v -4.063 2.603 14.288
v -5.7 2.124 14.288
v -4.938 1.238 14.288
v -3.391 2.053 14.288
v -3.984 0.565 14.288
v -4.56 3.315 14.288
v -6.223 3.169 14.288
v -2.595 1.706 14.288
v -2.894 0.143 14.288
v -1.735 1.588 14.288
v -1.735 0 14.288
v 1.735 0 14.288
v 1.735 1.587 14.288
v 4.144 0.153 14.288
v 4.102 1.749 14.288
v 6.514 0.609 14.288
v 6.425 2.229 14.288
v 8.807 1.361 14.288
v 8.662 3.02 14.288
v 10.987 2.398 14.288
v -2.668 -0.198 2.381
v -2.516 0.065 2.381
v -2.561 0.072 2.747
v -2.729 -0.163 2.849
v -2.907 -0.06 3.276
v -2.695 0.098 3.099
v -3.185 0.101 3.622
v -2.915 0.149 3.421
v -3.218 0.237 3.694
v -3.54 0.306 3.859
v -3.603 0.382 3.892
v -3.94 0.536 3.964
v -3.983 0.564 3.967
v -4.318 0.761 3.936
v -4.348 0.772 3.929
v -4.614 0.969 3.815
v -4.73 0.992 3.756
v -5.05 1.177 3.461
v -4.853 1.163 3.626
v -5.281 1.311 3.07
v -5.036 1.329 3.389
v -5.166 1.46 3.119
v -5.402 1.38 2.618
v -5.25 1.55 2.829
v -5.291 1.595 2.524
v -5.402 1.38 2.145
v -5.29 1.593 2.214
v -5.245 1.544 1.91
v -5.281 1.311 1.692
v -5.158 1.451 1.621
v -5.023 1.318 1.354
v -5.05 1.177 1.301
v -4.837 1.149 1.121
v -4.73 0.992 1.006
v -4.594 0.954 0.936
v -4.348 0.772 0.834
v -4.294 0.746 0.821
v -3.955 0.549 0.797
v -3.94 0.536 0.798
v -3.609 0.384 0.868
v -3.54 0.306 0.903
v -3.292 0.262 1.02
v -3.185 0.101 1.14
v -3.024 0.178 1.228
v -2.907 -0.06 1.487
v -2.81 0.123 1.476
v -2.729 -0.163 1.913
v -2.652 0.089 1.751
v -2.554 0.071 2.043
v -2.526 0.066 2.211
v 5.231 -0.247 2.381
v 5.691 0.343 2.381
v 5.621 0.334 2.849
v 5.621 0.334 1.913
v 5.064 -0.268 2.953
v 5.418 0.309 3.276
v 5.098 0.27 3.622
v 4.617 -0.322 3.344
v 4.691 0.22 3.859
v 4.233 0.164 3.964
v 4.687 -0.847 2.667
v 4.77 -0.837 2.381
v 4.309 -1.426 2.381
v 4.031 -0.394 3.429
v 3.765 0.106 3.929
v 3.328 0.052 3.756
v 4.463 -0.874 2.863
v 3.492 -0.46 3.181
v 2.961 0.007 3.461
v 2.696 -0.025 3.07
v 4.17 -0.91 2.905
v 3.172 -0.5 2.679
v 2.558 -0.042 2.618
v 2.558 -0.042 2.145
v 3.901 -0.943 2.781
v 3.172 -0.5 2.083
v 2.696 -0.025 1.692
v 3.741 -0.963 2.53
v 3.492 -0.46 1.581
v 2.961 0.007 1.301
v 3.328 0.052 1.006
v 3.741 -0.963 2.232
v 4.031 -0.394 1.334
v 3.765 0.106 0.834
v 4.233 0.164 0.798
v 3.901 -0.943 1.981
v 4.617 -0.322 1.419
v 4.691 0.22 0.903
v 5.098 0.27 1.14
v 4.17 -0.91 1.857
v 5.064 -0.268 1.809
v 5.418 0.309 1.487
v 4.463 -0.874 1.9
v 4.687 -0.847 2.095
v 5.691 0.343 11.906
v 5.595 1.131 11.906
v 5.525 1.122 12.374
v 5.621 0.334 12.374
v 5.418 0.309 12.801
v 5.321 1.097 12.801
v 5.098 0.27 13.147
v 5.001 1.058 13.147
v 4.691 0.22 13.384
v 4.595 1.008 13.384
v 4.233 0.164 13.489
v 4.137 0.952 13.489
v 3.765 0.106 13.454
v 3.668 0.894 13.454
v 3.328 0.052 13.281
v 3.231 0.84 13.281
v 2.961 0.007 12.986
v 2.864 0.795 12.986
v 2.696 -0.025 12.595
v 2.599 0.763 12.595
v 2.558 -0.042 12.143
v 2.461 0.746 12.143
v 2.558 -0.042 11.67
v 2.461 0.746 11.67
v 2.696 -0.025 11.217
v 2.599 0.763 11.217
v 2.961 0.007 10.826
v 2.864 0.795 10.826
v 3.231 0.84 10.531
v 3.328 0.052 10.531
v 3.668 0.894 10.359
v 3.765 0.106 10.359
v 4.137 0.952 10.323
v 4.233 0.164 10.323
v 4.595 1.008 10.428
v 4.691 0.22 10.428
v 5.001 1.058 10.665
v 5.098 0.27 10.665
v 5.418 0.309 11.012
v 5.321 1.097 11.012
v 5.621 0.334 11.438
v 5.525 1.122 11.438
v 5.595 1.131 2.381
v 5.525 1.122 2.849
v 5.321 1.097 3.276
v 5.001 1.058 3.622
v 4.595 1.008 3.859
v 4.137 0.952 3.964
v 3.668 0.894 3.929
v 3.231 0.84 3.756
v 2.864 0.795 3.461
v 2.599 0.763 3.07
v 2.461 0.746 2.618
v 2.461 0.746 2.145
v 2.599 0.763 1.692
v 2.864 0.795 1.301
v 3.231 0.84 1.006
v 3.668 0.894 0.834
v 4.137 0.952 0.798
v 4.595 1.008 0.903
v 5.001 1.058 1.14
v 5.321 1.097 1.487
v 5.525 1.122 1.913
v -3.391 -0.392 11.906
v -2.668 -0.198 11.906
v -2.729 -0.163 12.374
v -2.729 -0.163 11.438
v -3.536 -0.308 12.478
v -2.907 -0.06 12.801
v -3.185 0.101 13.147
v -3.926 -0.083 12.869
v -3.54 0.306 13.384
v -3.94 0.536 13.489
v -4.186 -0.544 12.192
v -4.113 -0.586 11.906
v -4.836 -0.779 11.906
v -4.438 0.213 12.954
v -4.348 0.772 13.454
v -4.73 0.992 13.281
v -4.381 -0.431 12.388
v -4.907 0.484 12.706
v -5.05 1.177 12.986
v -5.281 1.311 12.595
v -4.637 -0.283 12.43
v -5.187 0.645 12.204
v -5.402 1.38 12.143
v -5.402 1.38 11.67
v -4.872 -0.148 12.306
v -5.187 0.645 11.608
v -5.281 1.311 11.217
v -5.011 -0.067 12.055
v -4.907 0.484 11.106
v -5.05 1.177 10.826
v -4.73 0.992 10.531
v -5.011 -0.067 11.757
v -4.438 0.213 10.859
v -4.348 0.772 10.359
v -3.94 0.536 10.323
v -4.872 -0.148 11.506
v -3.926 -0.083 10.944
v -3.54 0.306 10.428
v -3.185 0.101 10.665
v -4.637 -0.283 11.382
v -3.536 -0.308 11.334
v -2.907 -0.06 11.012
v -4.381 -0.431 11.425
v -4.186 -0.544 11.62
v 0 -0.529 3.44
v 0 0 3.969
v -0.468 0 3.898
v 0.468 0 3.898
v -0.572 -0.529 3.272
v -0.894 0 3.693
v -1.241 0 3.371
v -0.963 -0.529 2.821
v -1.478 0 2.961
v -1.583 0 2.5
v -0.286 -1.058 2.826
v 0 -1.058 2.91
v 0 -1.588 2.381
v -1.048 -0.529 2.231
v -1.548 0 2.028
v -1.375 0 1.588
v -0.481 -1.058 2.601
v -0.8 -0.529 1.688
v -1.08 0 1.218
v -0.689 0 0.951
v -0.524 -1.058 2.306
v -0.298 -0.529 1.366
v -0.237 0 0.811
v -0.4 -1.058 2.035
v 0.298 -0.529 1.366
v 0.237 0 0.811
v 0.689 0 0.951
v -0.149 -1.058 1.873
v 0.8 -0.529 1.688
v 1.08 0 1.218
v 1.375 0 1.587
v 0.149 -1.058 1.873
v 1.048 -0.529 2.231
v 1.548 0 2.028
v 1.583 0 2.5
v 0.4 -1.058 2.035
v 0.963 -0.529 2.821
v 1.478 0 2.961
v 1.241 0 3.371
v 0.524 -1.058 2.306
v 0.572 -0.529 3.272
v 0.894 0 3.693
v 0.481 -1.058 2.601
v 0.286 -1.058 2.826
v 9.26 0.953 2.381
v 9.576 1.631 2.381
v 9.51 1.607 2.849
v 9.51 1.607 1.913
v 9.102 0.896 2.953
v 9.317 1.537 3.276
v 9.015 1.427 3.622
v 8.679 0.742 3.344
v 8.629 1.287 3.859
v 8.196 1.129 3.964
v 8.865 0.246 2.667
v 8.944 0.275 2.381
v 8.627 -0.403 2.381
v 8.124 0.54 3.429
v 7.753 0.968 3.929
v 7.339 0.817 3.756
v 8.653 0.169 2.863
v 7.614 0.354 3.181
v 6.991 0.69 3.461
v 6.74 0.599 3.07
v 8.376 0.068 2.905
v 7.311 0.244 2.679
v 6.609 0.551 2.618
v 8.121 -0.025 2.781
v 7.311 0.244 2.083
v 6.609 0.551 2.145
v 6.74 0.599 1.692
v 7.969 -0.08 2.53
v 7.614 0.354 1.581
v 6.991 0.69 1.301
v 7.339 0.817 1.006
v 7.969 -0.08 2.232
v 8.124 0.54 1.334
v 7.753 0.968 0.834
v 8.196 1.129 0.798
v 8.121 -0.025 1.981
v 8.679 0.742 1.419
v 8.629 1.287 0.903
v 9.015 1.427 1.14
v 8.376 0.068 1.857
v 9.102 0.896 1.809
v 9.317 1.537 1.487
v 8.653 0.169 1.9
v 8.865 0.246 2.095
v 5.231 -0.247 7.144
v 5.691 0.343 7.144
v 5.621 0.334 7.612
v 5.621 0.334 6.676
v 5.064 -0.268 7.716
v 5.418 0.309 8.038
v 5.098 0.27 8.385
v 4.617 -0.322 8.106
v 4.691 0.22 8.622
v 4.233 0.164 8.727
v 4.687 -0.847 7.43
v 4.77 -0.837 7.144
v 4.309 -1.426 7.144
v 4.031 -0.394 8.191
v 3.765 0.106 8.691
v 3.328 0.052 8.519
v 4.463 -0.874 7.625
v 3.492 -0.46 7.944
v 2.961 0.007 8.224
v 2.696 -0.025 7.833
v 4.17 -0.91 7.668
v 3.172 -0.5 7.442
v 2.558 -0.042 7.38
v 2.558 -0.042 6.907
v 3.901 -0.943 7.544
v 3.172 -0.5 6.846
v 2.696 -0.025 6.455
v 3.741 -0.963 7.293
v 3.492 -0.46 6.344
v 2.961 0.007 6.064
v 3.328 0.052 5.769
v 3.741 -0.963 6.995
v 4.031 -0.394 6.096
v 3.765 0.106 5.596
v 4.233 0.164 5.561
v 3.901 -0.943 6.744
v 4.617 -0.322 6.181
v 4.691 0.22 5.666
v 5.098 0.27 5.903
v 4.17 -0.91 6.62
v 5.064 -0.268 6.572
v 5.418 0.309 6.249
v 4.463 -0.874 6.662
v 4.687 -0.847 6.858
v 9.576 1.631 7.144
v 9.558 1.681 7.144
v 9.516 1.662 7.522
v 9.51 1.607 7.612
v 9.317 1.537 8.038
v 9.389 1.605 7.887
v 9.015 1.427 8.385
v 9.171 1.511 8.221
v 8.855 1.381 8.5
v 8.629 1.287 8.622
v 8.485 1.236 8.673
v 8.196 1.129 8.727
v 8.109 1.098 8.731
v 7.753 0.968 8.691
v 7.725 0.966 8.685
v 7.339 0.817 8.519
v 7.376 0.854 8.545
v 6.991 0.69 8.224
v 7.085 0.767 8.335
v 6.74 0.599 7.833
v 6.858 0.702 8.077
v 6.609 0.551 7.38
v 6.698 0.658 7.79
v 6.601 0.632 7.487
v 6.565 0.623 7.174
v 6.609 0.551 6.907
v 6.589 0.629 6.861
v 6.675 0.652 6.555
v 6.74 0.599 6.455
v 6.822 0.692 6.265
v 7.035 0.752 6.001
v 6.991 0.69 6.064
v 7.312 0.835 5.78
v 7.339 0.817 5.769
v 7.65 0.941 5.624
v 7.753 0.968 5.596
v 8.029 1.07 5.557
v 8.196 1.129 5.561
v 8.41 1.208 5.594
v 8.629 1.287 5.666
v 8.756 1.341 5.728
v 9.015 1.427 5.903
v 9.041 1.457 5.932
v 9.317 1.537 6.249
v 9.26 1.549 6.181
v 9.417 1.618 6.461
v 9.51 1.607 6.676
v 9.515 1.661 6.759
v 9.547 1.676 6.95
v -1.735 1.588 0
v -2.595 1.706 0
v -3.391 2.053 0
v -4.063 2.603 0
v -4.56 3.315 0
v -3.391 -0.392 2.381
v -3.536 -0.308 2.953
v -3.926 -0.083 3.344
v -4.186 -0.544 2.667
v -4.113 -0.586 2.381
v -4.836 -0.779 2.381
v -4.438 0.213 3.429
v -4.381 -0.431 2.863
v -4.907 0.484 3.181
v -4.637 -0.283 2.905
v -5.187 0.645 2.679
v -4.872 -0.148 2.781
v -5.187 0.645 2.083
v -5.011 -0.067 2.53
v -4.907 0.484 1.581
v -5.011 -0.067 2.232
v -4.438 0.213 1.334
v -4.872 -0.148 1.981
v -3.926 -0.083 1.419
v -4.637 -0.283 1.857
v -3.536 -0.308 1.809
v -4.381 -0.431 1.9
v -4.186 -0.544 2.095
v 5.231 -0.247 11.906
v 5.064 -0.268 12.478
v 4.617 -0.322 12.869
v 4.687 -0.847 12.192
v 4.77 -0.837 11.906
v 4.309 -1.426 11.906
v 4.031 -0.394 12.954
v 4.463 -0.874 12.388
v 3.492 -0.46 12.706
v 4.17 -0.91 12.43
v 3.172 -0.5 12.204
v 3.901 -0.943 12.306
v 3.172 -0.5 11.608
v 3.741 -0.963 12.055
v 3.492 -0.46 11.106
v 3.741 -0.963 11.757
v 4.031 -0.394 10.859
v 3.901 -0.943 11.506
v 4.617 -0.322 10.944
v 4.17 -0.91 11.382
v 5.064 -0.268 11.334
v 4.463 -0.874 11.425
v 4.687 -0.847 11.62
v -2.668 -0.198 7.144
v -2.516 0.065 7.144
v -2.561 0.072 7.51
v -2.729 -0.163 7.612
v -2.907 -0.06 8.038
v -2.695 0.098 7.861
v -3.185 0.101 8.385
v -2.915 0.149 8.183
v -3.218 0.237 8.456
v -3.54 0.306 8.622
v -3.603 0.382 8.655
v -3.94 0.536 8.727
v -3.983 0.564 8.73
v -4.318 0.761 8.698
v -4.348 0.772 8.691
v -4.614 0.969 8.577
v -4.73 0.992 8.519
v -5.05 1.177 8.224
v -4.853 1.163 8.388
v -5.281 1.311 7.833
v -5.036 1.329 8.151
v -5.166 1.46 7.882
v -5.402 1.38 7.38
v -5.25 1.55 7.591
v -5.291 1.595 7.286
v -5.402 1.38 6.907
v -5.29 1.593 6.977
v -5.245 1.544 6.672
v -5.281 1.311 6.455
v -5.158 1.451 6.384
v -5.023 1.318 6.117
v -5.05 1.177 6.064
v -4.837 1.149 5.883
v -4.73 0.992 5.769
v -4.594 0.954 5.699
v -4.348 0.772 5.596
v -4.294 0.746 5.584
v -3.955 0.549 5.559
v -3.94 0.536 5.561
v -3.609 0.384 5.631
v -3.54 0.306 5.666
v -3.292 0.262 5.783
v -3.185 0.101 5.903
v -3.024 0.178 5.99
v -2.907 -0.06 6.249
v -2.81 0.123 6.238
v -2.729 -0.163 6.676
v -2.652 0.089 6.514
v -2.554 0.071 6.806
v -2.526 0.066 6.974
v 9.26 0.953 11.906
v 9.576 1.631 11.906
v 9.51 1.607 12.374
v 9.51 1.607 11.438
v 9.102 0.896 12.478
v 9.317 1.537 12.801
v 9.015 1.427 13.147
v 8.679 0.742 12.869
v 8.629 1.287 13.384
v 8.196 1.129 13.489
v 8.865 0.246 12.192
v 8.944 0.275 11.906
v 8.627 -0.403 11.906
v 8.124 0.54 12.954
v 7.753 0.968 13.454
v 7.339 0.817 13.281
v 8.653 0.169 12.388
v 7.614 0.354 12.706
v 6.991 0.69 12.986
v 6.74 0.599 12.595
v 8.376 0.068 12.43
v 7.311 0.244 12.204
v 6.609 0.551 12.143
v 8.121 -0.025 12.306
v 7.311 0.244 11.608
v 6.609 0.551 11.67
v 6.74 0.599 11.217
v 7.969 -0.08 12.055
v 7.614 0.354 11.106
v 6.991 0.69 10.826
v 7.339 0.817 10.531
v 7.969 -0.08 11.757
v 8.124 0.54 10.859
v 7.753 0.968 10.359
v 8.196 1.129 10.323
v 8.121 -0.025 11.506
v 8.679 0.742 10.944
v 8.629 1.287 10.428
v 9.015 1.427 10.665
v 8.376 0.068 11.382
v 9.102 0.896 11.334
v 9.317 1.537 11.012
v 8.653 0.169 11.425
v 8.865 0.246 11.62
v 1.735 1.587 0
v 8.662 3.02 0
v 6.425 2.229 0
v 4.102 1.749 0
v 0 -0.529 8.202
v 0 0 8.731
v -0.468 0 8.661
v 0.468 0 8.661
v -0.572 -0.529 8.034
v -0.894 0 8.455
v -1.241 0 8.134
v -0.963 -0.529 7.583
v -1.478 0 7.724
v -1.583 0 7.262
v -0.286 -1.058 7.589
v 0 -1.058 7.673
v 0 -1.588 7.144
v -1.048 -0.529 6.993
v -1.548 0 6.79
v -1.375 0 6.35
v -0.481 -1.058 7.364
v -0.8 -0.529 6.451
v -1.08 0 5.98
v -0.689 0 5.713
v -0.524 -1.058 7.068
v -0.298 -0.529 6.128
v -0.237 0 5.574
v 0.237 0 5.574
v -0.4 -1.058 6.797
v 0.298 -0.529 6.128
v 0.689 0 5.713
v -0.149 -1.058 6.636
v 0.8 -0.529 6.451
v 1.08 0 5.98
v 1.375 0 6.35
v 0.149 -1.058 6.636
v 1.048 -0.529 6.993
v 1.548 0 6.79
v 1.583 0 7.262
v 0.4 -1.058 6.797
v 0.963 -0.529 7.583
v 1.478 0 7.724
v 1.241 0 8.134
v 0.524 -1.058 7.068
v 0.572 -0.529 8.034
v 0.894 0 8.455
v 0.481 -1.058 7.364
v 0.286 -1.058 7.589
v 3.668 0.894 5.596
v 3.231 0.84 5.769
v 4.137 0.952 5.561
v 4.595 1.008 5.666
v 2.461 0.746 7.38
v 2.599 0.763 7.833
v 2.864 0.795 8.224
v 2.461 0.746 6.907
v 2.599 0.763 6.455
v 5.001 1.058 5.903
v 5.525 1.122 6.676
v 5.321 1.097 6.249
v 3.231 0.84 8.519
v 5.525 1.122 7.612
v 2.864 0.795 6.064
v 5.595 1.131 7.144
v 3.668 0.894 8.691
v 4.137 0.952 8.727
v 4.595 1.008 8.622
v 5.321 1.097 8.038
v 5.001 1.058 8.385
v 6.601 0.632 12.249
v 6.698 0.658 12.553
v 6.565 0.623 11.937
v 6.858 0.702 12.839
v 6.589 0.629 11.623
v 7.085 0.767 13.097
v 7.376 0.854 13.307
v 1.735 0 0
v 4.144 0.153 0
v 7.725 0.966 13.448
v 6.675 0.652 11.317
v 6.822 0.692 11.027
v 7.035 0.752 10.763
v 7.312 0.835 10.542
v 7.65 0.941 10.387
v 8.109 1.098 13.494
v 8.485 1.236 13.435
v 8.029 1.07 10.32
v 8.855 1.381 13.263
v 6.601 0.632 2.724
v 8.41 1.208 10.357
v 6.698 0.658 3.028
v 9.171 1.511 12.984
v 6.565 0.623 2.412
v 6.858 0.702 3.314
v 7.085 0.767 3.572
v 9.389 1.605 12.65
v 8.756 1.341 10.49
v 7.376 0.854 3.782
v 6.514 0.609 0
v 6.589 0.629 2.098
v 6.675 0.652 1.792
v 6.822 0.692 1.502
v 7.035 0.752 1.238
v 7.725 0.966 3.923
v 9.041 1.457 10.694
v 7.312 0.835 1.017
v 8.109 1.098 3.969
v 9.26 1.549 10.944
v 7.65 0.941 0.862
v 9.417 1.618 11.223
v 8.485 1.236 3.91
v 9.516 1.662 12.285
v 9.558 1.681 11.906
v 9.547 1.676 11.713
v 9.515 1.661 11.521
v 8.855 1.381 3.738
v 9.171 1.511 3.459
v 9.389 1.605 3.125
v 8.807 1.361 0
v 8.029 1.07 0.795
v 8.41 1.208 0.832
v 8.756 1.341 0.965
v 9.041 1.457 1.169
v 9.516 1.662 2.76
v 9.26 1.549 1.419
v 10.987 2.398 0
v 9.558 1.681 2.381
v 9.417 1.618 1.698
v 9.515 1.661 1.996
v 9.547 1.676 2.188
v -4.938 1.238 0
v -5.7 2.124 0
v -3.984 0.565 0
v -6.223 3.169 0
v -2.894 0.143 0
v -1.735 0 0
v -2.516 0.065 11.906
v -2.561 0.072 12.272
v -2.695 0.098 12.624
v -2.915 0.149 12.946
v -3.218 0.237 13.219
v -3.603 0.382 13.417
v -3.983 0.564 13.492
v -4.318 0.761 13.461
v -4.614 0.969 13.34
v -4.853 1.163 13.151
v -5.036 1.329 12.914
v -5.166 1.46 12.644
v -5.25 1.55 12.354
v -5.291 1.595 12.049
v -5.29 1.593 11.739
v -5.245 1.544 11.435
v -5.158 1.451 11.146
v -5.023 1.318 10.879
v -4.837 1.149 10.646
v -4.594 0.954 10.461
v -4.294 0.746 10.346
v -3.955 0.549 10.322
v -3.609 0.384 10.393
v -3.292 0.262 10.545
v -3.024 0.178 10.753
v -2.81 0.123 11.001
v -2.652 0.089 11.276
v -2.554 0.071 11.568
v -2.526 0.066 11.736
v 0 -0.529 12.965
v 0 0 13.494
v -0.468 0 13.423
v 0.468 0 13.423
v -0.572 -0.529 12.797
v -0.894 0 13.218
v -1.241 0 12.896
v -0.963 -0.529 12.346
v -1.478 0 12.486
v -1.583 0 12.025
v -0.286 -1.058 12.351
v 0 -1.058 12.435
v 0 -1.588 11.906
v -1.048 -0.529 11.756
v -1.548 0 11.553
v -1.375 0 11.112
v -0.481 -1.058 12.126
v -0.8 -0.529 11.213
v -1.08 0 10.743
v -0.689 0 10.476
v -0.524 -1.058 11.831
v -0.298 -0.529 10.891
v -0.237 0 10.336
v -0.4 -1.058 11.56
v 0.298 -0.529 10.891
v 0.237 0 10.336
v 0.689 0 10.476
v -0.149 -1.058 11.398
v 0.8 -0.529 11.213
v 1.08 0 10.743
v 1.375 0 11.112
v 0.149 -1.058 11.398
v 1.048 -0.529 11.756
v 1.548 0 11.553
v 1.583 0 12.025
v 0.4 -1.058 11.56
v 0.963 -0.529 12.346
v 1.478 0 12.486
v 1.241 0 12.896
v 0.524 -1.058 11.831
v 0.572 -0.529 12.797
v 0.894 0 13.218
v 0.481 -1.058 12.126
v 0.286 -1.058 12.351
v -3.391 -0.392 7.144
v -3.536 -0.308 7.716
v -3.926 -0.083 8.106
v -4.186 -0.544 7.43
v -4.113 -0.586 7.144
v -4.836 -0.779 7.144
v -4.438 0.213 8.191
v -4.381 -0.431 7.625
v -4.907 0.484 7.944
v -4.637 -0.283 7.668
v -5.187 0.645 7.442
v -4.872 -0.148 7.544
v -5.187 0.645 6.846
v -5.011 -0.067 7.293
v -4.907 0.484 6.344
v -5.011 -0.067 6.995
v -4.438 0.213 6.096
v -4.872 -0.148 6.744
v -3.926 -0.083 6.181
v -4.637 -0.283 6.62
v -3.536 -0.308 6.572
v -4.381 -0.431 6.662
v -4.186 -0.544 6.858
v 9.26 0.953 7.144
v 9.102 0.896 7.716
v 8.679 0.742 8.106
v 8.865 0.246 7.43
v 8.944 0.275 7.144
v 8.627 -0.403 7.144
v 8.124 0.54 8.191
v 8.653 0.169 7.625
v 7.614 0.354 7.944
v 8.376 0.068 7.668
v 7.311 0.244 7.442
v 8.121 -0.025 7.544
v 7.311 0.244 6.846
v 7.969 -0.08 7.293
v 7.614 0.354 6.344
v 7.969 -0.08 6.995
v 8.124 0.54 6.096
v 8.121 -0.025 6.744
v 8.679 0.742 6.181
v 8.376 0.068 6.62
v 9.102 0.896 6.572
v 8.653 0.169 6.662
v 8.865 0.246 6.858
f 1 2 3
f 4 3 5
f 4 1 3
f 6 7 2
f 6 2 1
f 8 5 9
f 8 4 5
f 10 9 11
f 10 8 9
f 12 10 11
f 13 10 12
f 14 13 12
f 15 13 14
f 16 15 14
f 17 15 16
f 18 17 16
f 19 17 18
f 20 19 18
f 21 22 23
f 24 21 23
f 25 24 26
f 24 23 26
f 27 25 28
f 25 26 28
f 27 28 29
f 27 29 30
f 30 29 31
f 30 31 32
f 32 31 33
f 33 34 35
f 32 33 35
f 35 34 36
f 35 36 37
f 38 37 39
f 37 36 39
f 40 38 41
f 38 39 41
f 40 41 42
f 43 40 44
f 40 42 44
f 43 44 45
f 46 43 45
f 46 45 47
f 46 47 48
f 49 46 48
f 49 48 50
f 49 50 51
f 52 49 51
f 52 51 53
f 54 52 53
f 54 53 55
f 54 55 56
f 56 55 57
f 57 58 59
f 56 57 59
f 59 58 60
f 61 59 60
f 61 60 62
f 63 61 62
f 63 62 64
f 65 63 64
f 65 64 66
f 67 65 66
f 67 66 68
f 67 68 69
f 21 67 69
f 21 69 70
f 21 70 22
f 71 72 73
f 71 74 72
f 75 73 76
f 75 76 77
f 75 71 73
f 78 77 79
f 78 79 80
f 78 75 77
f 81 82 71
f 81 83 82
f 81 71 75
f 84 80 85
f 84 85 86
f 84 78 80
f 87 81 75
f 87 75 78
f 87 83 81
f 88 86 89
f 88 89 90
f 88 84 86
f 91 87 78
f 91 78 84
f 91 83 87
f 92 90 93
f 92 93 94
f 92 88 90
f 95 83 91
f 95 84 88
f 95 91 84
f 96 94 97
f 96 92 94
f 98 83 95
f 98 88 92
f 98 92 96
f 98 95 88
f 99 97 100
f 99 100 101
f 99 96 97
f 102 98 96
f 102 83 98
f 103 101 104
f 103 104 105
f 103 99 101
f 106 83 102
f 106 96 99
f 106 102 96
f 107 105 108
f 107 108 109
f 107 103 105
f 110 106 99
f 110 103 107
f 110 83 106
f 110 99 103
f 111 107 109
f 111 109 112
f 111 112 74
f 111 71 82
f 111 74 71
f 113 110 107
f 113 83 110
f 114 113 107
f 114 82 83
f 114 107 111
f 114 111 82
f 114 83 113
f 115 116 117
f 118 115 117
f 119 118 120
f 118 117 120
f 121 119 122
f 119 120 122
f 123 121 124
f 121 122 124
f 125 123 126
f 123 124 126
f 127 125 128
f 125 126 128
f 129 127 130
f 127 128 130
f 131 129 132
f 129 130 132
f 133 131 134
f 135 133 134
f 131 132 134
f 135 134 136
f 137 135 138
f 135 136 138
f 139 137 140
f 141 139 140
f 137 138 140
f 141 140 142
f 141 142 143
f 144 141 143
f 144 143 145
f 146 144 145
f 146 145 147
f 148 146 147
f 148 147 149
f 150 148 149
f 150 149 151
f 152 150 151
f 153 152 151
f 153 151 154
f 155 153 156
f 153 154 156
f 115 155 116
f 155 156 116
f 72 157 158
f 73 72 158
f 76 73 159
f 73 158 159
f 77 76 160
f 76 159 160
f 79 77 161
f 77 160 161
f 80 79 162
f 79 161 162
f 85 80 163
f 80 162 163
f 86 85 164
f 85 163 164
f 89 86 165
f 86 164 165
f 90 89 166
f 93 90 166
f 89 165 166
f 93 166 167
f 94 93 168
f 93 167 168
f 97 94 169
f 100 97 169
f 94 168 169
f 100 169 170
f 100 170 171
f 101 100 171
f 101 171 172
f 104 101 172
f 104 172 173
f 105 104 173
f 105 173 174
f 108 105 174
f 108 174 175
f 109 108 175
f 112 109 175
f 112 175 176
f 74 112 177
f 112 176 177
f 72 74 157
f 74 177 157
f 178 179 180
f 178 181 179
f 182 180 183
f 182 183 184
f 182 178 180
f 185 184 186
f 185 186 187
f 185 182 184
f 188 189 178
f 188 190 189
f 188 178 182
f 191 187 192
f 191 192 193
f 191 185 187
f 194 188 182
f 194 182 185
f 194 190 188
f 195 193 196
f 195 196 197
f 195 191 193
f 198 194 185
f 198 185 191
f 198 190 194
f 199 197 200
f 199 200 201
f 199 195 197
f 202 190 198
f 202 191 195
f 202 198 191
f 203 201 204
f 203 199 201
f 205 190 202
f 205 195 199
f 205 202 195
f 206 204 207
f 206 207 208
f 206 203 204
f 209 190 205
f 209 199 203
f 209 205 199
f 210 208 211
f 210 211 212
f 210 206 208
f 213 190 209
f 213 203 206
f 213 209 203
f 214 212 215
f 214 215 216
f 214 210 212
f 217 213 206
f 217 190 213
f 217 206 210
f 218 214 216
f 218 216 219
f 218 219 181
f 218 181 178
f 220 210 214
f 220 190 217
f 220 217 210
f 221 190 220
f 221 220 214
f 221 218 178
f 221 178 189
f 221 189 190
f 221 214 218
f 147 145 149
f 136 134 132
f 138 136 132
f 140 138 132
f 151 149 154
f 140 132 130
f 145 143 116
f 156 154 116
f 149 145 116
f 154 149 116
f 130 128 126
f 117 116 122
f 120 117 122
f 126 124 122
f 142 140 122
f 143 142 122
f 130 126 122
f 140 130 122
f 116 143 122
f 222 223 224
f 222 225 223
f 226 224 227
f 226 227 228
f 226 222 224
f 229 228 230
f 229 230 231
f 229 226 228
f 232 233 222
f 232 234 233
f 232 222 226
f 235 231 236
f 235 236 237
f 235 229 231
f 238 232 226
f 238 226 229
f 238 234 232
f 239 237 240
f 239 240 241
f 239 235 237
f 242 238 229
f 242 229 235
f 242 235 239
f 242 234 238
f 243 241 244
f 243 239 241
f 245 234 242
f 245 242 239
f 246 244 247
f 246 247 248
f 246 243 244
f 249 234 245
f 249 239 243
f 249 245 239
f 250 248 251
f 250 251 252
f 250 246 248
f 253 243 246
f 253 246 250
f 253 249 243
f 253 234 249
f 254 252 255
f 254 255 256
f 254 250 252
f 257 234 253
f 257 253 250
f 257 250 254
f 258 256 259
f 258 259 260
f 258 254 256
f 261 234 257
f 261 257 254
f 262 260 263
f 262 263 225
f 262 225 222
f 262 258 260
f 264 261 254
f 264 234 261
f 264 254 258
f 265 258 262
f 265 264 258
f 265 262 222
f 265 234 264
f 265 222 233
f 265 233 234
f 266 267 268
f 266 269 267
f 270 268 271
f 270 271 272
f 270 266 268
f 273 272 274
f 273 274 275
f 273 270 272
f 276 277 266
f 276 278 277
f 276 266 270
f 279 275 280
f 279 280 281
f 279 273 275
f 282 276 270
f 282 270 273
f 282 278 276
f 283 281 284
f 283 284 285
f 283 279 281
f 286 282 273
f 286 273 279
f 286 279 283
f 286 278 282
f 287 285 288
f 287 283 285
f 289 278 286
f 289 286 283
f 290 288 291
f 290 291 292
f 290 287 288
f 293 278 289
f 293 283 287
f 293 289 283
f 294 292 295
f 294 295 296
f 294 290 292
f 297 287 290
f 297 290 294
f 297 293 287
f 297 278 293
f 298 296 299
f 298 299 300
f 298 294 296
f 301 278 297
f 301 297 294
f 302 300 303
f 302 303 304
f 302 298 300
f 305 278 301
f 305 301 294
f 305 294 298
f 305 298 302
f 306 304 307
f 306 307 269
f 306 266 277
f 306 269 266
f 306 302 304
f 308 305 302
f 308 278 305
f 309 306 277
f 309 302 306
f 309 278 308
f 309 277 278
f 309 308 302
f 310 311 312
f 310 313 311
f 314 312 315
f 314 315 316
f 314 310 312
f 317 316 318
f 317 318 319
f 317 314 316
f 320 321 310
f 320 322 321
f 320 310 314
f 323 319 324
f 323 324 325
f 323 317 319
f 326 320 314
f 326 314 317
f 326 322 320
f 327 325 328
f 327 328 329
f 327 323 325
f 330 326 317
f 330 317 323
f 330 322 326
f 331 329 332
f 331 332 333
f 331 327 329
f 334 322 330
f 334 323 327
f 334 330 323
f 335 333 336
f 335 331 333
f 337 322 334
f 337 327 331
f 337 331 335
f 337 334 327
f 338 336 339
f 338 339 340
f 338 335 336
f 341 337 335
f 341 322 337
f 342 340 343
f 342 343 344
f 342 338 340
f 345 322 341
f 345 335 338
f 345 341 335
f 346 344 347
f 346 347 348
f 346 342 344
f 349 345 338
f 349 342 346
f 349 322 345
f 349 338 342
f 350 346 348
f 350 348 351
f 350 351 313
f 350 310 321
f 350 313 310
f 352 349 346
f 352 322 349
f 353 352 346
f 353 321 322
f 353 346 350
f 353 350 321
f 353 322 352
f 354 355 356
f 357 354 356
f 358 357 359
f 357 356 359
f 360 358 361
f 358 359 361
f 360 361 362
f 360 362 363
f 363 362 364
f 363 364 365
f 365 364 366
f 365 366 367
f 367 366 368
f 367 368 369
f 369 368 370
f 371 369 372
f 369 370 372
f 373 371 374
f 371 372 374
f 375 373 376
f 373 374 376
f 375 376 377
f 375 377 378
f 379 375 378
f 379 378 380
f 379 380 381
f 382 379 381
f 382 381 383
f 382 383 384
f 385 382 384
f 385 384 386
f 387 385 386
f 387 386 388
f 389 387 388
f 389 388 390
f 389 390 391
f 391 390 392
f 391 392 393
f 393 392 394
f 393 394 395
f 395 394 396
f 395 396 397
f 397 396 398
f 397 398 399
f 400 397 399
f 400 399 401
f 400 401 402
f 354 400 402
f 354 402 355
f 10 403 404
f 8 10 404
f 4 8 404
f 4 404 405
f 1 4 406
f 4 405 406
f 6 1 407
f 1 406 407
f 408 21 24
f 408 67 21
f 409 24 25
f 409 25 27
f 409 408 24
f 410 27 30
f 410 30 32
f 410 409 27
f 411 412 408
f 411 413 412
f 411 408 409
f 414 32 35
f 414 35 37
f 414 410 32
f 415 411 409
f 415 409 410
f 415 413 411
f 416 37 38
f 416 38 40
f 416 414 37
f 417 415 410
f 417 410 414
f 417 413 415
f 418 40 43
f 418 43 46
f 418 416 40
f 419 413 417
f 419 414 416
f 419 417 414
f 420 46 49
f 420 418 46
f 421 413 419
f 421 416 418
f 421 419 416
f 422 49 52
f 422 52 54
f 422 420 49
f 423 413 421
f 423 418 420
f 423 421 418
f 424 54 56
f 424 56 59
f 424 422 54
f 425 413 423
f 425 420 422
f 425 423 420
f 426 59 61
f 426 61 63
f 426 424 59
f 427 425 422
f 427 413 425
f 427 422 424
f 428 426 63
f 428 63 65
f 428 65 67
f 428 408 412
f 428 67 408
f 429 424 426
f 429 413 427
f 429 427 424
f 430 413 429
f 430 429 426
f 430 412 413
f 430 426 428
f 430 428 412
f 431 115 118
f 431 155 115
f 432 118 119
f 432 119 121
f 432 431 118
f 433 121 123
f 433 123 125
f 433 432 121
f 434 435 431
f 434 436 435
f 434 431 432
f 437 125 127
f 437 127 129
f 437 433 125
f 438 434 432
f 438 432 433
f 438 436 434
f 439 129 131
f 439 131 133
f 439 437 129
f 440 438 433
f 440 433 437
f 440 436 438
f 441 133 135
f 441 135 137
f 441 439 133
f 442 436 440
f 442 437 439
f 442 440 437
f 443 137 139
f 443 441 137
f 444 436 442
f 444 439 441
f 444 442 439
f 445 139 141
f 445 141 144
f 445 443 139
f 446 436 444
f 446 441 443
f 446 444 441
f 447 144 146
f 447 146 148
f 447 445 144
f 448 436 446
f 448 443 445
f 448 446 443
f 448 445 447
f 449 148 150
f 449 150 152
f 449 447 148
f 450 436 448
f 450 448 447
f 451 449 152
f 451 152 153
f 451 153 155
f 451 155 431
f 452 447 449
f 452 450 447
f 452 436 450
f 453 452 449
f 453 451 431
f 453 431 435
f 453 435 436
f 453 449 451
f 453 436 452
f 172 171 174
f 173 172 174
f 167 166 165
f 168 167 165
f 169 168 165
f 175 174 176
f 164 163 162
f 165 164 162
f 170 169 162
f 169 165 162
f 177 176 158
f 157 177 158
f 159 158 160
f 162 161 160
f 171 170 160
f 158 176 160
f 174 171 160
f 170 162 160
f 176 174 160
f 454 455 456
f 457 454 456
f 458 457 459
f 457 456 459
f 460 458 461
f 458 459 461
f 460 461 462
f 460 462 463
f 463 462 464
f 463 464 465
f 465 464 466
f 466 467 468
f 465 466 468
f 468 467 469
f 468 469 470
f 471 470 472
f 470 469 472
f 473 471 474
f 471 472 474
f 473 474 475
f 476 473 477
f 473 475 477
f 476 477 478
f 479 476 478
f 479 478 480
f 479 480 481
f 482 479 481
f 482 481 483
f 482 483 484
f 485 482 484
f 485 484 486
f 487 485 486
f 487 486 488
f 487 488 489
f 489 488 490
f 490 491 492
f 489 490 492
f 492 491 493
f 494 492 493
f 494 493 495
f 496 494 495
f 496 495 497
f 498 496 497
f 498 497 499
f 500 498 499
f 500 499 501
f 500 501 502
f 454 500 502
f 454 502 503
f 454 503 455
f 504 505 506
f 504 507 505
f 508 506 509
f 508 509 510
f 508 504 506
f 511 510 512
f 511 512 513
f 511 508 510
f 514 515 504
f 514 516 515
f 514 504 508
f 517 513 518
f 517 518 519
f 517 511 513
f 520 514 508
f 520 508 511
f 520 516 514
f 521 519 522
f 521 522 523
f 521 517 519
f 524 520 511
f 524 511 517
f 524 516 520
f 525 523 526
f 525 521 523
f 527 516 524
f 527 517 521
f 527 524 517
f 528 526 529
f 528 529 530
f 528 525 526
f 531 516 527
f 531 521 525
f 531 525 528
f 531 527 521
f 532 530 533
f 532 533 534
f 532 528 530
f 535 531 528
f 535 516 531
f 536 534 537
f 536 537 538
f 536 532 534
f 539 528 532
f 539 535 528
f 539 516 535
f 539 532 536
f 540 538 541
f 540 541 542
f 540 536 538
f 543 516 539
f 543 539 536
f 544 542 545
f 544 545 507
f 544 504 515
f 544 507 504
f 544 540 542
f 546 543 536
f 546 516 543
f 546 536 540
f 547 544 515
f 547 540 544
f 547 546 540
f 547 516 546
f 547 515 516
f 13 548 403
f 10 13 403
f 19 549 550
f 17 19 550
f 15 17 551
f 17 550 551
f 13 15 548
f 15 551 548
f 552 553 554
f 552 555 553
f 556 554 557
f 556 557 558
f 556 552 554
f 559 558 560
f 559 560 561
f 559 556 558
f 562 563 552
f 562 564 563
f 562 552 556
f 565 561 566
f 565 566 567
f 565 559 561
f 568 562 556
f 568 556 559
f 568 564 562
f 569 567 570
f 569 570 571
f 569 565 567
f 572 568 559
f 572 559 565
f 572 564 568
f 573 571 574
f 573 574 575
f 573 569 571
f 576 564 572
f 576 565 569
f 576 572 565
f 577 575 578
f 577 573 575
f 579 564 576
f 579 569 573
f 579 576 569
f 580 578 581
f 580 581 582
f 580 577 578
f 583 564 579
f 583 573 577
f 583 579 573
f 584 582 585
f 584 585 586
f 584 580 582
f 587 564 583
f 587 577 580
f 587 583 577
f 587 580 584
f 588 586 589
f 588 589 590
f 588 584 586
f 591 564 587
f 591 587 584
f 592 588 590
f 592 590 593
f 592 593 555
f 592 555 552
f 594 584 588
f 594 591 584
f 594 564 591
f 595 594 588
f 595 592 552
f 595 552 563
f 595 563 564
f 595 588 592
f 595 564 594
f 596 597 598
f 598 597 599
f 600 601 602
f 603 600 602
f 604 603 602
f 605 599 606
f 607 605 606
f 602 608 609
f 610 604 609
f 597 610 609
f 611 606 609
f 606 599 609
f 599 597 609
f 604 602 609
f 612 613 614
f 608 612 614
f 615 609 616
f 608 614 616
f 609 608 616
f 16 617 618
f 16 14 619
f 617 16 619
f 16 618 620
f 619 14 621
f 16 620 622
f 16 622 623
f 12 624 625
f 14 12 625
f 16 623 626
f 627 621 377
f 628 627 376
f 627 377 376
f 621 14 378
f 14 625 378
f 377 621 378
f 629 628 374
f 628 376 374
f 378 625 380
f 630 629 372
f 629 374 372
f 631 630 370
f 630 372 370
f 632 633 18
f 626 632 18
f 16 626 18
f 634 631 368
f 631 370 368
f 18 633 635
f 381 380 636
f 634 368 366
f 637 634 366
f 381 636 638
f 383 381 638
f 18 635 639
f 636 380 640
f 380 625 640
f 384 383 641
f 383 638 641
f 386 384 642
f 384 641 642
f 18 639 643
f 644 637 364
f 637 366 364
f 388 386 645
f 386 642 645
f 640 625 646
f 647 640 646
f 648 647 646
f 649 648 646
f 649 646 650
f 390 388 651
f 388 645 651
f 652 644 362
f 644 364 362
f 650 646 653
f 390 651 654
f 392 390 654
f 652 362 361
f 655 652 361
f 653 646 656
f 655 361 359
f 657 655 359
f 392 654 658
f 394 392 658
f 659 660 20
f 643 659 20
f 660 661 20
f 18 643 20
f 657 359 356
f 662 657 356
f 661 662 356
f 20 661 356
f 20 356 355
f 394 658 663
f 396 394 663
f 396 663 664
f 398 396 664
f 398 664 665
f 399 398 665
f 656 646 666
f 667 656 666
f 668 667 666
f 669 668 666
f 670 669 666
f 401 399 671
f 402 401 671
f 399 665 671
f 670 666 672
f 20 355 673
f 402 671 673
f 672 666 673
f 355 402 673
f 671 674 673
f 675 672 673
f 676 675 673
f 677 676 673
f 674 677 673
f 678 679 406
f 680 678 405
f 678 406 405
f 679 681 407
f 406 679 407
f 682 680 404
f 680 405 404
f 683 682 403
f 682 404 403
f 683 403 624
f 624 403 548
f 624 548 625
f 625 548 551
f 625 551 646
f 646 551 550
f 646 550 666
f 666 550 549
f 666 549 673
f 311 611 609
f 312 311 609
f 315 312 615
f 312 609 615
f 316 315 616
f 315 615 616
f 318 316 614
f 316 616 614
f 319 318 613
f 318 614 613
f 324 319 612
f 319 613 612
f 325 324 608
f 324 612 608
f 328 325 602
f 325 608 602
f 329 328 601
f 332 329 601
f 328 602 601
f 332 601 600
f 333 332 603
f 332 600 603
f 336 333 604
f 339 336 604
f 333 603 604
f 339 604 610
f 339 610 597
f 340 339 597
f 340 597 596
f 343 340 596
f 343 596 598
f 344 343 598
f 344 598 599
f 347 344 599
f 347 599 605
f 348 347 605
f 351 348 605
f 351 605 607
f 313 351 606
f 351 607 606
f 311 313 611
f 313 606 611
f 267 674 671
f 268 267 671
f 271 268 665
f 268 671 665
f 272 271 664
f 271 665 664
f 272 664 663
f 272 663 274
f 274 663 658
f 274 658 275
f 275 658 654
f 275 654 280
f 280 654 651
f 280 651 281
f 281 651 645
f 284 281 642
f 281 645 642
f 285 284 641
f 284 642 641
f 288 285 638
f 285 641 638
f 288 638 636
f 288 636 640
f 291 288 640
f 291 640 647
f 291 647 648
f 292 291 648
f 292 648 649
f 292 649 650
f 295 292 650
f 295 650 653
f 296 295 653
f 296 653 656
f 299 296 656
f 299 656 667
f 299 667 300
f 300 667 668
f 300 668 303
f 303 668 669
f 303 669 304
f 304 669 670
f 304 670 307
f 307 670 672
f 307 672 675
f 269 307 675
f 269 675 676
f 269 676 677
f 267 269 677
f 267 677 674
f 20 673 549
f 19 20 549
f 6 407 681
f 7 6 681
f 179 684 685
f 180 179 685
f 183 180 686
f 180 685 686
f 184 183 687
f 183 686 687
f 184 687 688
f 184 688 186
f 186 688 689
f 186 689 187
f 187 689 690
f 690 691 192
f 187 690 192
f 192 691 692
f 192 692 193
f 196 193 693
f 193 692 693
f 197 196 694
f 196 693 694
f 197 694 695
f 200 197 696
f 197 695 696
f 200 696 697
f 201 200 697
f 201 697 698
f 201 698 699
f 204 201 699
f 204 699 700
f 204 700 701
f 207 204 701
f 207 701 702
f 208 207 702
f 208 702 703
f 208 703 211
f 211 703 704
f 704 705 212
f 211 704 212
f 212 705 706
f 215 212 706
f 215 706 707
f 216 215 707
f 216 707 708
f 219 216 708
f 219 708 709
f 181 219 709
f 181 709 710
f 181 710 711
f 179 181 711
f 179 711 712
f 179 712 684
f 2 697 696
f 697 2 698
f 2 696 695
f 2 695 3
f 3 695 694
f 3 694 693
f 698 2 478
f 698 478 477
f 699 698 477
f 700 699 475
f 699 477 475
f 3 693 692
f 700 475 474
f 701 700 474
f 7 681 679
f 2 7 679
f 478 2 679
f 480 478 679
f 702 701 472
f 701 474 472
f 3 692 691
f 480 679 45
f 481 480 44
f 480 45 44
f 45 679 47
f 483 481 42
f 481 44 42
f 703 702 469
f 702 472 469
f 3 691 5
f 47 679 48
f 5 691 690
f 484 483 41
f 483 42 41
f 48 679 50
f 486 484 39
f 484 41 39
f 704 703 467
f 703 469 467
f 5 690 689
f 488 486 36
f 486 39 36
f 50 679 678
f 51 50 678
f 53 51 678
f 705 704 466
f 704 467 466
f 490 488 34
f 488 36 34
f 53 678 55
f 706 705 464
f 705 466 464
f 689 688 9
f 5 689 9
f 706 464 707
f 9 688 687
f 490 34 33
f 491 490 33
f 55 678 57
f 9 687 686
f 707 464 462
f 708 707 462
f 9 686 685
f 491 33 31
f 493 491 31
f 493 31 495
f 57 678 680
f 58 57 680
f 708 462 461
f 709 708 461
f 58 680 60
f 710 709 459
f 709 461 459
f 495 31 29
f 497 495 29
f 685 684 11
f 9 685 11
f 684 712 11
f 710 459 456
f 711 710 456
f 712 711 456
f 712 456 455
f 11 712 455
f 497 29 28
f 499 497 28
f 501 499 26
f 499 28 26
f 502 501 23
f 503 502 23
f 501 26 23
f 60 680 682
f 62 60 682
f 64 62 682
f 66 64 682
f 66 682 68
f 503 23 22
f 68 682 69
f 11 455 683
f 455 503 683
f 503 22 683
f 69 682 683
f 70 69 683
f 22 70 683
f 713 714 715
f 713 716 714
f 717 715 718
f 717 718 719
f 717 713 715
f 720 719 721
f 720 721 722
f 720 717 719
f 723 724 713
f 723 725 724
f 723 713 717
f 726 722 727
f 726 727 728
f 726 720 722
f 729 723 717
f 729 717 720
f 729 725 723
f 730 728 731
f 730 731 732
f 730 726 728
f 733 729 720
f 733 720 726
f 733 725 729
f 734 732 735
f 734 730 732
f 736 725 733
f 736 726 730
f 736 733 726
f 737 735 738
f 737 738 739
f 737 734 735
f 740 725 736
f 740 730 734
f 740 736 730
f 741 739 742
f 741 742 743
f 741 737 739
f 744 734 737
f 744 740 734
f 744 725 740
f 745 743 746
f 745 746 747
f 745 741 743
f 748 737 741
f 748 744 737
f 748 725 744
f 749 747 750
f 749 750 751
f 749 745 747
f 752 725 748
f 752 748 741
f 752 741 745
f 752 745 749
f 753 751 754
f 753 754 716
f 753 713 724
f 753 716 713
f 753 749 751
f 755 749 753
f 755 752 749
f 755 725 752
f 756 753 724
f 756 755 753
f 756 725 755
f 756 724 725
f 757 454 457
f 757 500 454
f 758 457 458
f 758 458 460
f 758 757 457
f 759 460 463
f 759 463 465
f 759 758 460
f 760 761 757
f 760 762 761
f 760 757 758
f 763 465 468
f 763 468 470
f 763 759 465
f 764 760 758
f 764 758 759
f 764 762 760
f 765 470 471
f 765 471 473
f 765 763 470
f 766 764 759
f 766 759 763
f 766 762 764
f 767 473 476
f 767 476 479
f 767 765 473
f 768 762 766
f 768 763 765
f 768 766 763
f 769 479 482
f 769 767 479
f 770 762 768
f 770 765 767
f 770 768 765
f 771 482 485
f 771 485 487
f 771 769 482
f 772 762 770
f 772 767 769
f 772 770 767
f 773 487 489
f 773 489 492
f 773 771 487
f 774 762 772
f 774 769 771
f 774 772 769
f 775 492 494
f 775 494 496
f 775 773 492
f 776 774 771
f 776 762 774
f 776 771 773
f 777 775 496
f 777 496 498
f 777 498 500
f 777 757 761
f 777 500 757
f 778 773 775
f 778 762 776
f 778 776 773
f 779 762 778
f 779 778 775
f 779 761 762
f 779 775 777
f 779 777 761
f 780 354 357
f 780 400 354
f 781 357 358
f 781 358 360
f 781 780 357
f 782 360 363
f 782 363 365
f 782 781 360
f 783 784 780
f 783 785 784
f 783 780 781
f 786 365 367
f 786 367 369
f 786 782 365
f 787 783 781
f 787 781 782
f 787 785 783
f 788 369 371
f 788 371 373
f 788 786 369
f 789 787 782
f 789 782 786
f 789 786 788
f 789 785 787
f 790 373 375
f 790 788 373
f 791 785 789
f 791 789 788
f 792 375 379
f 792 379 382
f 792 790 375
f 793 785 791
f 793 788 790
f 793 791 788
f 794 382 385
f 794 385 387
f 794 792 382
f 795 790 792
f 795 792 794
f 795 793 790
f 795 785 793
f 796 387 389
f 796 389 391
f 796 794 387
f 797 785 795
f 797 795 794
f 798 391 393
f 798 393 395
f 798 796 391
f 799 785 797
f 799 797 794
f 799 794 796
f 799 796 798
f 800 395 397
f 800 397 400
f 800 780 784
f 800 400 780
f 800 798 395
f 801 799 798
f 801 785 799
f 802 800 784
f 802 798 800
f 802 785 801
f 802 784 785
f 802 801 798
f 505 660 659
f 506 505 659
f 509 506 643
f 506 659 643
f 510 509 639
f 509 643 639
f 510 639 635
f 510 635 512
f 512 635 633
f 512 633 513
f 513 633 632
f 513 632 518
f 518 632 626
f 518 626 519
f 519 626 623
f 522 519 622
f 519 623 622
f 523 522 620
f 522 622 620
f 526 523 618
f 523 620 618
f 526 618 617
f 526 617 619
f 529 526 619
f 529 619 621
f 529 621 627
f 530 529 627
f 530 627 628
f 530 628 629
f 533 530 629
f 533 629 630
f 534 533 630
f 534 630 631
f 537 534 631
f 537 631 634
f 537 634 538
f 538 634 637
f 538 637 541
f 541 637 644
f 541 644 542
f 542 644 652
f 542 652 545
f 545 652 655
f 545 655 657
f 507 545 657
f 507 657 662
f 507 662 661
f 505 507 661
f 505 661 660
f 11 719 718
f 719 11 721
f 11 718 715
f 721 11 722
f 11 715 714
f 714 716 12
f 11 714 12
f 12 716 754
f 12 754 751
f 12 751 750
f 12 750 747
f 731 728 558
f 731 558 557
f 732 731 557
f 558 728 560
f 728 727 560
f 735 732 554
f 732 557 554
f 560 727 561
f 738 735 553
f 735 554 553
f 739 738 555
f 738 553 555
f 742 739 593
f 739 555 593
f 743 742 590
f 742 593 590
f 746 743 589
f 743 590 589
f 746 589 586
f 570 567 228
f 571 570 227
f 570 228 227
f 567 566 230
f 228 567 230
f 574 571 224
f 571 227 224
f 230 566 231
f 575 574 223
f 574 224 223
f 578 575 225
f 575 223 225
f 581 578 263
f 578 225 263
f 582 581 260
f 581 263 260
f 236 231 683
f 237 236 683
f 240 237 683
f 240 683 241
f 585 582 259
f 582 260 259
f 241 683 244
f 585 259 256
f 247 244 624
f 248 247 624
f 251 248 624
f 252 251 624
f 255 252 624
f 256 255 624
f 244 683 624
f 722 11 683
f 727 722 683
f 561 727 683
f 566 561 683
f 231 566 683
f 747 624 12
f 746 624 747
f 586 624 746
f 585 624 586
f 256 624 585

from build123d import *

# Parameters (mm, degrees)
BOSS_EXTRUDE1_DEPTH        = 14.2875
SKETCH2_R                  = 1.5875
BOSS_EXTRUDE2_DEPTH        = 1.5875
CHAMFER1_SIZE              = 1.5875
BOSS_EXTRUDE3_DEPTH        = 1.5875
BOSS_EXTRUDE3_DEPTH_BACK   = 0.79375
SKETCH3_R                  = 1.5875
CHAMFER2_SIZE              = 1.5875
BOSS_EXTRUDE4_DEPTH        = 1.5875
BOSS_EXTRUDE4_DEPTH_BACK   = 0.79375
SKETCH5_R                  = 1.5875
BOSS_EXTRUDE4_2_DEPTH      = 1.5875
BOSS_EXTRUDE4_2_DEPTH_BACK = 0.79375
BOSS_EXTRUDE4_3_DEPTH      = 1.5875
BOSS_EXTRUDE4_3_DEPTH_BACK = 0.79375
CHAMFER3_SIZE              = 1.5875
CHAMFER4_SIZE              = 1.5875
CHAMFER5_SIZE              = 1.5875
BOSS_EXTRUDE5_DEPTH        = 1.5875
BOSS_EXTRUDE5_DEPTH_BACK   = 0.79375
SKETCH6_R                  = 1.5875
CHAMFER6_SIZE              = 1.5875


with BuildPart() as part:
    # Sketch1 → Boss-Extrude1 (new body)
    with BuildSketch(Plane.XY):
        with BuildLine():
            Line((-1.73482, 0), (1.73482, 0))
            ThreePointArc((1.73482, 0), (6.513582382, 0.609123391), (10.98674309, 2.397540147))
            Line((10.98674309, 2.397540147), (8.662299056, 3.020373049))
            ThreePointArc((8.662299056, 3.020373049), (5.271877083, 1.949469791), (1.73482, 1.5875))
            Line((1.73482, 1.5875), (-1.73482, 1.5875))
            ThreePointArc((-1.73482, 1.5875), (-3.390629266, 2.053455764), (-4.560432944, 3.314557843))
            Line((-4.560432944, 3.314557843), (-6.222862733, 3.169114083))
            ThreePointArc((-6.222862733, 3.169114083), (-4.481900798, 0.872133264), (-1.73482, 0))
        make_face()
    extrude(amount=BOSS_EXTRUDE1_DEPTH)

    # Sketch2 → Boss-Extrude2 (add)
    with BuildSketch(Plane.XZ):
        with Locations(Location((0, 2.38125, 0), (0, 0, 90))):
            Circle(SKETCH2_R)
        with Locations(Location((0, 7.14375, 0), (0, 0, 90))):
            Circle(SKETCH2_R)
        with Locations(Location((0, 11.90625, 0), (0, 0, 90))):
            Circle(SKETCH2_R)
    extrude(amount=BOSS_EXTRUDE2_DEPTH)

    # Chamfer1
    chamfer1_edges = [part.edges().sort_by_distance(p)[0] for p in [
        (0, -1.5875, 0.79375),
        (0, -1.5875, 5.55625),
        (0, -1.5875, 10.31875),
    ]]
    chamfer(chamfer1_edges, length=CHAMFER1_SIZE - 0.0001)  # a hair under: the kernel refuses the full size

    # Sketch3 → Boss-Extrude3 (add, two sides: drawn at the far end of the back side and taken through both)
    with BuildSketch(Plane(origin=(-0.752732007, -1.303770081, 0), x_dir=(0, 0, -1), z_dir=(-0.500000000000001, -0.866025403784438, 0)).offset(-BOSS_EXTRUDE3_DEPTH_BACK)):
        with Locations(Location((-2.38125, -3.798714252, 0), (0, 0, 90))):
            Circle(SKETCH3_R)
        with Locations(Location((-7.14375, -3.798714252, 0), (0, 0, 90))):
            Circle(SKETCH3_R)
        with Locations(Location((-11.90625, -3.798714252, 0), (0, 0, 90))):
            Circle(SKETCH3_R)
    extrude(amount=BOSS_EXTRUDE3_DEPTH + BOSS_EXTRUDE3_DEPTH_BACK)

    # Chamfer2
    chamfer2_edges = [part.edges().sort_by_distance(p)[0] for p in [
        (-6.21108038, 0.014521717, 2.38125),
        (-6.21108038, 0.014521717, 7.14375),
        (-6.21108038, 0.014521717, 11.90625),
    ]]
    chamfer(chamfer2_edges, length=CHAMFER2_SIZE - 0.0001)  # a hair under: the kernel refuses the full size

    # Sketch6 → Boss-Extrude5 (add, two sides: drawn at the far end of the back side and taken through both)
    with BuildSketch(Plane(origin=(0.595867138, -1.637131506, 0), x_dir=(0, 0, -1), z_dir=(0.34202014332566943, -0.9396926207859081, 0)).offset(-BOSS_EXTRUDE5_DEPTH_BACK)):
        with Locations(Location((-11.90625, 7.969168433, 0), (0, 0, 90))):
            Circle(SKETCH6_R)
        with Locations(Location((-7.14375, 7.969168433, 0), (0, 0, 90))):
            Circle(SKETCH6_R)
        with Locations(Location((-2.38125, 7.969168433, 0), (0, 0, 90))):
            Circle(SKETCH6_R)
    extrude(amount=BOSS_EXTRUDE5_DEPTH + BOSS_EXTRUDE5_DEPTH_BACK)

    # Chamfer6
    chamfer6_edges = [part.edges().sort_by_distance(p)[0] for p in [
        (7.13563085, -0.946234389, 11.90625),
        (7.13563085, -0.946234389, 7.14375),
        (7.13563085, -0.946234389, 2.38125),
    ]]
    chamfer(chamfer6_edges, length=CHAMFER6_SIZE - 0.0001)  # a hair under: the kernel refuses the full size


with BuildPart() as body_2:
    # Sketch5 → Boss-Extrude4 (new, two sides: drawn at the far end of the back side and taken through both)
    with BuildSketch(Plane(origin=(0.04307072, -0.350782867, 0), x_dir=(0, 0, -1), z_dir=(0.12186934340514774, -0.992546151641322, 0)).offset(-BOSS_EXTRUDE4_DEPTH_BACK)):
        with Locations(Location((-7.14375, 4.103138915, 0), (0, 0, 90))):
            Circle(SKETCH5_R)
    extrude(amount=BOSS_EXTRUDE4_DEPTH + BOSS_EXTRUDE4_DEPTH_BACK)

    # Chamfer4
    chamfer4_edges = [body_2.edges().sort_by_distance(p)[0] for p in [
        (2.733426027, -1.61987062, 7.14375),
    ]]
    chamfer(chamfer4_edges, length=CHAMFER4_SIZE - 0.0001)  # a hair under: the kernel refuses the full size


with BuildPart() as body_3:
    # Sketch5 → Boss-Extrude4 2 (new, two sides: drawn at the far end of the back side and taken through both)
    with BuildSketch(Plane(origin=(0.04307072, -0.350782867, 0), x_dir=(0, 0, -1), z_dir=(0.12186934340514774, -0.992546151641322, 0)).offset(-BOSS_EXTRUDE4_2_DEPTH_BACK)):
        with Locations(Location((-2.38125, 4.103138915, 0), (0, 0, 90))):
            Circle(SKETCH5_R)
    extrude(amount=BOSS_EXTRUDE4_2_DEPTH + BOSS_EXTRUDE4_2_DEPTH_BACK)

    # Chamfer5
    chamfer5_edges = [body_3.edges().sort_by_distance(p)[0] for p in [
        (2.733426027, -1.61987062, 2.38125),
    ]]
    chamfer(chamfer5_edges, length=CHAMFER5_SIZE - 0.0001)  # a hair under: the kernel refuses the full size


with BuildPart() as body_4:
    # Sketch5 → Boss-Extrude4 3 (new, two sides: drawn at the far end of the back side and taken through both)
    with BuildSketch(Plane(origin=(0.04307072, -0.350782867, 0), x_dir=(0, 0, -1), z_dir=(0.12186934340514774, -0.992546151641322, 0)).offset(-BOSS_EXTRUDE4_3_DEPTH_BACK)):
        with Locations(Location((-11.90625, 4.103138915, 0), (0, 0, 90))):
            Circle(SKETCH5_R)
    extrude(amount=BOSS_EXTRUDE4_3_DEPTH + BOSS_EXTRUDE4_3_DEPTH_BACK)

    # Chamfer3
    chamfer3_edges = [body_4.edges().sort_by_distance(p)[0] for p in [
        (2.733426027, -1.61987062, 11.90625),
    ]]
    chamfer(chamfer3_edges, length=CHAMFER3_SIZE - 0.0001)  # a hair under: the kernel refuses the full size


solid = Compound([part.part, body_2.part, body_3.part, body_4.part])
